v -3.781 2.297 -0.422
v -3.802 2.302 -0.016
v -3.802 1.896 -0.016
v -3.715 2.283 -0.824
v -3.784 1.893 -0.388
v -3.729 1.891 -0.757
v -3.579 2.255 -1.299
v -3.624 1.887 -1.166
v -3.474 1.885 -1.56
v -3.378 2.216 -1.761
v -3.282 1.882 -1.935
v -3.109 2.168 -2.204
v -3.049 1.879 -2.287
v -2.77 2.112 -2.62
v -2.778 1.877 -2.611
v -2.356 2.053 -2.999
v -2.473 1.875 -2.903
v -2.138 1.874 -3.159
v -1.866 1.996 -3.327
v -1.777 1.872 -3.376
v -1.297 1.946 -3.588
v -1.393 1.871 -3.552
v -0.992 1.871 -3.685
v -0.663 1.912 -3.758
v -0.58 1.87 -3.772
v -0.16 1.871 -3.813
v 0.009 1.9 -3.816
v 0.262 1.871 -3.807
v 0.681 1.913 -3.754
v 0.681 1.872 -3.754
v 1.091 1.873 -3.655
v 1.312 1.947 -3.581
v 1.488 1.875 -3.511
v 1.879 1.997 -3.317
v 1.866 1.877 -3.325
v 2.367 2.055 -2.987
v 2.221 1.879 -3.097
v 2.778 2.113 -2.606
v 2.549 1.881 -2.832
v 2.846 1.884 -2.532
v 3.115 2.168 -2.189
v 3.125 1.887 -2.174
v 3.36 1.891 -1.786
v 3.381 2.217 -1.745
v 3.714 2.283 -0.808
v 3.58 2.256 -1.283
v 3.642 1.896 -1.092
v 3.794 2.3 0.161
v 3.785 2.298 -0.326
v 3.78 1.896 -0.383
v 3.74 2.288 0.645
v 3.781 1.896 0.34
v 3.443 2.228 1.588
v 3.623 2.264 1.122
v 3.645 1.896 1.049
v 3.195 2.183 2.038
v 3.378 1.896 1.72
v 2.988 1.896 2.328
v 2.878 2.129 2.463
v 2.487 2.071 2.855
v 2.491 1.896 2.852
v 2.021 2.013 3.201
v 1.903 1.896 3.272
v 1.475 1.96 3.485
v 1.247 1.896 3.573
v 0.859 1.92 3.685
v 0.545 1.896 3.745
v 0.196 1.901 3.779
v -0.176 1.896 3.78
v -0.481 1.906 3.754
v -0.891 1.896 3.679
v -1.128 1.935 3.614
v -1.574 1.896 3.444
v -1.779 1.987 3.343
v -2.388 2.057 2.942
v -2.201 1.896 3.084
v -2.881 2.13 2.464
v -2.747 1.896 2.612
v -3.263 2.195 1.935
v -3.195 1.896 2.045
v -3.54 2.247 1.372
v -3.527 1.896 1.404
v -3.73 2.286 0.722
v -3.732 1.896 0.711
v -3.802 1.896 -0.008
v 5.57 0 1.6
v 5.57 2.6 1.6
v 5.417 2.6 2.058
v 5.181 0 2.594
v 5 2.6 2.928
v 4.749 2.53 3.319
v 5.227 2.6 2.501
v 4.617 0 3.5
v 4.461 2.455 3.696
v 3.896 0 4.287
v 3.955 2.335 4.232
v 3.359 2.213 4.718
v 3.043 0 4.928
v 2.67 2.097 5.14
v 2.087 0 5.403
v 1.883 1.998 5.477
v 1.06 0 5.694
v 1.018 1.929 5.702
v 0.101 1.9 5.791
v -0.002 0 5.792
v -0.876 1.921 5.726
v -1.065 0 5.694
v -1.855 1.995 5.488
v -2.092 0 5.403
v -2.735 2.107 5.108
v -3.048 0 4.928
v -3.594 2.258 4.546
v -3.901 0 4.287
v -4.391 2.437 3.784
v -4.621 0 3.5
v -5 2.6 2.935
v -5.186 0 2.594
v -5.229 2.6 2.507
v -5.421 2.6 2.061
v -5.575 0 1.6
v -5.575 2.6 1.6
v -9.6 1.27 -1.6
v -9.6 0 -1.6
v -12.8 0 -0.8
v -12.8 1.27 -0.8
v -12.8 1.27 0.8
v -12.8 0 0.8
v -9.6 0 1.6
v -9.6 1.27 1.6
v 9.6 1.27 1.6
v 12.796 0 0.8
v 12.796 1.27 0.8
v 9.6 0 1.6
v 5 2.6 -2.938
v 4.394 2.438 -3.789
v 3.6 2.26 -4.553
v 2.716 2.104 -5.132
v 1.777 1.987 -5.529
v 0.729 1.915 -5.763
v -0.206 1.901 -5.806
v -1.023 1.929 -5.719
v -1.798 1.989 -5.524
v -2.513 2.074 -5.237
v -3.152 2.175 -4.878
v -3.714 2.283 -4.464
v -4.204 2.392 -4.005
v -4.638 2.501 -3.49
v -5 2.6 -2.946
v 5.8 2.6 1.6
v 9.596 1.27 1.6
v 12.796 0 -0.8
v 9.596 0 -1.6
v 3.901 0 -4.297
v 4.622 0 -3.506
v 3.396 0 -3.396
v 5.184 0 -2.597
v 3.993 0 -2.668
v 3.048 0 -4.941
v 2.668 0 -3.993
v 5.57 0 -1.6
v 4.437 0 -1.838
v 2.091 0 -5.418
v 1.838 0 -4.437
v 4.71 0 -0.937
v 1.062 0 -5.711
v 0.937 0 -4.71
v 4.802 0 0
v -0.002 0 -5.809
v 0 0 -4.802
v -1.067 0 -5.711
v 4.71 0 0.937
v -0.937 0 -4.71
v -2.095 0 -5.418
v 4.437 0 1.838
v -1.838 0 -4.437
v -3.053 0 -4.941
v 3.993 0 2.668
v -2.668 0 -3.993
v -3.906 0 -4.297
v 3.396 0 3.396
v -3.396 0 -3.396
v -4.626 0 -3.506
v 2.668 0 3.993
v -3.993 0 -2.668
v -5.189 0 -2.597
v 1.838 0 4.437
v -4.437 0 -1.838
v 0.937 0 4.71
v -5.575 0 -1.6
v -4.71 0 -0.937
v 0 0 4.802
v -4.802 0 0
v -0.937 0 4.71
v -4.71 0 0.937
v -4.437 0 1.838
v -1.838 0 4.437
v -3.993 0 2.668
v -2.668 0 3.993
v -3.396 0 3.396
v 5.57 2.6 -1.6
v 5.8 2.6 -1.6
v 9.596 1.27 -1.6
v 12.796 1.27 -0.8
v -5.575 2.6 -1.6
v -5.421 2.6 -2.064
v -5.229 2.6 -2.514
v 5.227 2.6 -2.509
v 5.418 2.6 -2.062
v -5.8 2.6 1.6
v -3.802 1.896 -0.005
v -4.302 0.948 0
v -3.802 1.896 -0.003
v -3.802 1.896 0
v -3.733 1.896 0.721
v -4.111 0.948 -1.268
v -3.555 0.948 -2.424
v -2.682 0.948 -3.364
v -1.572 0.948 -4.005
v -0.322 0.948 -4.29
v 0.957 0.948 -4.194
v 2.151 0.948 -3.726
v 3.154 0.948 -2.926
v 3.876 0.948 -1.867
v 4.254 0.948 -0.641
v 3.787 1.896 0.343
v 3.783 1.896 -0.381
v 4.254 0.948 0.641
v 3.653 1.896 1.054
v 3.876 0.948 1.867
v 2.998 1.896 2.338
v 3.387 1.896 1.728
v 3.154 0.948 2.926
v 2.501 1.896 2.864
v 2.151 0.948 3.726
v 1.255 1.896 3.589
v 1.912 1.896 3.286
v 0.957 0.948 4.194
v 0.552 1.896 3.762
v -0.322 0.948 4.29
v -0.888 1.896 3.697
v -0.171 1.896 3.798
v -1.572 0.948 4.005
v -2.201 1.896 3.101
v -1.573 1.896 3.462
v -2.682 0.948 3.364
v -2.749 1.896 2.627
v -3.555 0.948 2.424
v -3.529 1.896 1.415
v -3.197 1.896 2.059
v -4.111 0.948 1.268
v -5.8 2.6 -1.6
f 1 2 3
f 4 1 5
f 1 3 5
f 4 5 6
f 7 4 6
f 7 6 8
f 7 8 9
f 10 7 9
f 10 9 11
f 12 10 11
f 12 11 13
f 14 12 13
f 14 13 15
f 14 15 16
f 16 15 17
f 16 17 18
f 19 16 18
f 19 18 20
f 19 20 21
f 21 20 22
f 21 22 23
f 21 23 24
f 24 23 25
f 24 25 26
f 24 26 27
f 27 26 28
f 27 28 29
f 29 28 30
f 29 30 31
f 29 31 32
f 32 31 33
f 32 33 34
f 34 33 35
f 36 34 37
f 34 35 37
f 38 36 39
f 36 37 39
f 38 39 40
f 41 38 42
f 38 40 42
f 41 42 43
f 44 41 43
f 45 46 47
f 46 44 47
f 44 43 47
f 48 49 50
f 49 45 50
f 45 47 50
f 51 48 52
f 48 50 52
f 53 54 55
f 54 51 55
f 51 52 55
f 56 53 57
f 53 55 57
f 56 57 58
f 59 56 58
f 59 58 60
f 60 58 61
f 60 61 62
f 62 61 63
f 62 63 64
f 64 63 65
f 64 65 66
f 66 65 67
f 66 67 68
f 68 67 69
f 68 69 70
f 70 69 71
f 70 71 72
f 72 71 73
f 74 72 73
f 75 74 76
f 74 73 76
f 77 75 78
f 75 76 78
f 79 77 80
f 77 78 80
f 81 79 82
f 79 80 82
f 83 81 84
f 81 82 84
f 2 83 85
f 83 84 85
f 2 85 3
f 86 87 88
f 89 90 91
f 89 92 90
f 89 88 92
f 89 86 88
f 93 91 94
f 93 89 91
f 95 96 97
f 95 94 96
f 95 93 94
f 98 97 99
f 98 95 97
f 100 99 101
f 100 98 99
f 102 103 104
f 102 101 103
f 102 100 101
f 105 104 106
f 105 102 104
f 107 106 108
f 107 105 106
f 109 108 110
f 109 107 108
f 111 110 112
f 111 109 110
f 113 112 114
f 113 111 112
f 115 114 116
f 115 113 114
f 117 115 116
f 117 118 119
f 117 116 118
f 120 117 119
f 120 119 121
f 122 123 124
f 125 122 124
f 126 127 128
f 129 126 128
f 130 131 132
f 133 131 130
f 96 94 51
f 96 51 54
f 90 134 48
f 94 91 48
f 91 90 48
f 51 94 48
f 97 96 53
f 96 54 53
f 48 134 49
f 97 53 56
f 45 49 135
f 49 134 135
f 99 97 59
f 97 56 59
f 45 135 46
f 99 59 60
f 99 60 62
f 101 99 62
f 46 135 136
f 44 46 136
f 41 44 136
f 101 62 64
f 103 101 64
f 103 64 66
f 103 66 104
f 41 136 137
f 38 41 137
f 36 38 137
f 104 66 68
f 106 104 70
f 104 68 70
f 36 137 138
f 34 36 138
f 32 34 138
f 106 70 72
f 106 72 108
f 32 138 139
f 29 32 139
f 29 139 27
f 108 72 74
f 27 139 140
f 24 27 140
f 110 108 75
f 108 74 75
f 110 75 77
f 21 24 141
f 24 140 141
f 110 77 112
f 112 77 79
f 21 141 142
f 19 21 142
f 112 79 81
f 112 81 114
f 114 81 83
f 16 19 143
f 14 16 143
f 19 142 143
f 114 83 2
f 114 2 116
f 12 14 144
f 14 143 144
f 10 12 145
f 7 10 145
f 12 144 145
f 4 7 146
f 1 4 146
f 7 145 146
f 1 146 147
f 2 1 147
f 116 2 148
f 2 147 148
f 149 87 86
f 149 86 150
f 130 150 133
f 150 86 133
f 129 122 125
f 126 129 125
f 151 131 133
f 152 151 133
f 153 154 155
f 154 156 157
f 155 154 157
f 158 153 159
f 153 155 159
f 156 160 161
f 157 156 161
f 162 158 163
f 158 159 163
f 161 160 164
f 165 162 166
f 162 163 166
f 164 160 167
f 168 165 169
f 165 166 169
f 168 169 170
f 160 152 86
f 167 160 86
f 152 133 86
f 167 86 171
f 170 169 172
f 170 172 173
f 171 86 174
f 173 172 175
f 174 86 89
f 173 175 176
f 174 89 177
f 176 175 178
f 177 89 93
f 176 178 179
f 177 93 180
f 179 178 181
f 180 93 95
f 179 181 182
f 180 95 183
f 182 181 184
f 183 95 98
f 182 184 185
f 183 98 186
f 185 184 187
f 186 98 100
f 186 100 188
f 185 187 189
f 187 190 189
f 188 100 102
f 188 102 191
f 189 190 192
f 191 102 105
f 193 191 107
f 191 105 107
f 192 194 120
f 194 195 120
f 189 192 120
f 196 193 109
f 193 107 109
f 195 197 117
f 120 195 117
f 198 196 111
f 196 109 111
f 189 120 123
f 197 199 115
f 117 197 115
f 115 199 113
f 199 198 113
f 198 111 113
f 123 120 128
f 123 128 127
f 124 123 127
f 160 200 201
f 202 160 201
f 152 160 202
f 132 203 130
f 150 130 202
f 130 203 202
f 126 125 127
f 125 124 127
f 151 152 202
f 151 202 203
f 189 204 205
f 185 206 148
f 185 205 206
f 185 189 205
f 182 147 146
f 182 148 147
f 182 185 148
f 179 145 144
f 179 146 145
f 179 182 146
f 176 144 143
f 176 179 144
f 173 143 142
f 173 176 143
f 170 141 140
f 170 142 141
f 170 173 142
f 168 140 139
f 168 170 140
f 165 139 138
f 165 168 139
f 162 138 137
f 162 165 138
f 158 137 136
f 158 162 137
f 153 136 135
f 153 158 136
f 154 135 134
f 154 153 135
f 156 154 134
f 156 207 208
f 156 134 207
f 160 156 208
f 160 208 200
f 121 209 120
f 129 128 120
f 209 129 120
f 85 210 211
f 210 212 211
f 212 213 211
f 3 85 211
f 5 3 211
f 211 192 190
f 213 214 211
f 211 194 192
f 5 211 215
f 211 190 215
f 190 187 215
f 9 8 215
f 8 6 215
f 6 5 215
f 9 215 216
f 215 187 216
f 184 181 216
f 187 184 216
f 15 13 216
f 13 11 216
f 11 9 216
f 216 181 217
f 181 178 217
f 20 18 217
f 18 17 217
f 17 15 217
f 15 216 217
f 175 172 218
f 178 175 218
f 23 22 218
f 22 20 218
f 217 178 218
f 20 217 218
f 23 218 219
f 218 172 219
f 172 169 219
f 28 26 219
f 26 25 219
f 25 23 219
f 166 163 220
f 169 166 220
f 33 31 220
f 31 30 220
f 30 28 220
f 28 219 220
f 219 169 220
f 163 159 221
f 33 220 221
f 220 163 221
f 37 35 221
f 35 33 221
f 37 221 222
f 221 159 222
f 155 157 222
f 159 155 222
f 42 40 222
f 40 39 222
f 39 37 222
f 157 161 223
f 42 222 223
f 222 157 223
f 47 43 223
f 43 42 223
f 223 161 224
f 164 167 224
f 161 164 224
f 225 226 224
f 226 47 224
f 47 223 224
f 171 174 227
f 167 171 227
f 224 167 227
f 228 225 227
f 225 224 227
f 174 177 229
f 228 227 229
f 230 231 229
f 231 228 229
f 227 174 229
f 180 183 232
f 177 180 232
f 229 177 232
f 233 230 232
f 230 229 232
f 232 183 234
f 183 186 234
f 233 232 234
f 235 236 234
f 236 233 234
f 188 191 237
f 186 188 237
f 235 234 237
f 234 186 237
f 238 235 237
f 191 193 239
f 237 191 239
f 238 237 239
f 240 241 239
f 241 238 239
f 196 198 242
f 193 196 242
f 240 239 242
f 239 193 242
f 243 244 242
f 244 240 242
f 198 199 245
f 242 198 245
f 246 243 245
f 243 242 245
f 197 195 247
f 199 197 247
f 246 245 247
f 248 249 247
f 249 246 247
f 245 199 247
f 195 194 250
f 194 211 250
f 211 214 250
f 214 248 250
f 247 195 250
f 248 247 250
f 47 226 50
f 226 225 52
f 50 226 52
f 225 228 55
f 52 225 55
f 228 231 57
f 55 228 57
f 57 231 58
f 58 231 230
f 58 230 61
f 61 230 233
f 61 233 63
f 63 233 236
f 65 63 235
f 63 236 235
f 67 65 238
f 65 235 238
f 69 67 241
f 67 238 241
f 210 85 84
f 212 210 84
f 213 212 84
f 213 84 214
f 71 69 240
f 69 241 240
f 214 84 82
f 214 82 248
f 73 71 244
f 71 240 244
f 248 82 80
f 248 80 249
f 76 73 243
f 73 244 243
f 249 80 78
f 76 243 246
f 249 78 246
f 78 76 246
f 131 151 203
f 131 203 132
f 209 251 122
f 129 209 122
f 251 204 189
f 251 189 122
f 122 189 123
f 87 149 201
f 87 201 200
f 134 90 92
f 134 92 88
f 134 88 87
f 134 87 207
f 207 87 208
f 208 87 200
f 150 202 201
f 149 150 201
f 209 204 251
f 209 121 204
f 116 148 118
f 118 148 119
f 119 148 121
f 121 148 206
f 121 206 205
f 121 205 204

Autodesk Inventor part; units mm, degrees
ref_plane "YZ Plane" through (0, 0, 0) normal (1, 0, 0) x (0, 1, 0)
ref_plane "XZ Plane" through (0, 0, 0) normal (0, 1, 0) x (-1, 0, 0)
ref_plane "XY Plane" through (0, 0, 0) normal (0, 0, 1) x (1, 0, 0)
sketch "Sketch1" plane through (0, 0, 0) normal (0, 1, 0) x (-1, 0, 0)
  circle A0 centre (0, 0) radius 4.8
  line L0 (5.5749, -1.6) -> (9.6, -1.6)
  line L1 (9.6, -1.6) -> (12.8, -0.8)
  line L2 (12.8, -0.8) -> (12.8, 0.8)
  line L3 (12.8, 0.8) -> (9.6, 1.6)
  line L4 (9.6, 1.6) -> (5.5749, 1.6)
  arc A1 (5.5749, 1.6) -> (-5.5704, 1.6) centre (0.0023, -0.0079) ccw
  line L5 (-5.5704, 1.6) -> (-9.6, 1.6)
  line L6 (-5.5704, -1.6) -> (-9.5955, -1.6)
  line L7 (-9.5955, -1.6) -> (-12.7955, -0.8)
  line L8 (-12.7955, -0.8) -> (-12.7955, 0.8)
  line L9 (-12.7955, 0.8) -> (-9.5955, 1.6)
  line L10 (-9.5955, 1.6) -> (-5.5704, 1.6)
  arc A2 (-5.5704, -1.6) -> (5.5749, -1.6) centre (0.0023, -0.0158) ccw
  circle A3 centre (0.0023, -0.0158) radius 3.8
  point P0 (-9.6, -1.207)
  dimension "d0" = 9.6
  dimension "d9" = 7.6
extrude "Extrusion1" add sketch "Sketch1" along normal blind 2.6 contours A0 | A2 L6 L7 L8 L9 L5 A1 L4 L3 L2 L1 L0
sketch "Sketch16" plane through (0, 0, 0) normal (0, 0, 1) x (1, 0, 0)
  line L0 (12.7955, 0) -> (12.7955, 2.6) projected
  line L1 (12.7955, 1.27) -> (9.5955, 1.27)
  line L2 (9.5955, 0) -> (9.5955, 2.6) projected
  line L3 (9.5955, 1.27) -> (5.8, 2.6)
  arc A0 (-5, 2.6) -> (5, 2.6) centre (0, 20.1101) ccw
  line L4 (-9.6, 0) -> (-9.6, 2.6) projected
  line L5 (12.7955, 1.27) -> (12.7955, 5.6941)
  line L6 (-12.8, 0) -> (-12.8, 2.6) projected
  line L7 (-12.8, 1.27) -> (-12.8, 6.6119)
  line L8 (-12.8, 6.6119) -> (12.7955, 5.6941)
  line L9 (5.8, 2.6) -> (5, 2.6)
  line L10 (-5, 2.6) -> (-5.8, 2.6)
  line L11 (-5.8, 2.6) -> (-9.6, 1.27)
  line L12 (-9.6, 1.27) -> (-12.8, 1.27)
  line L13 (9.5955, 1.27) -> (5.8, 2.6)
  line L14 (9.5955, 1.27) -> (5.8, 2.6)
  line L15 (5.8, 2.6) -> (5, 2.6)
  point P0 (0, 0)
  dimension "d5" = 10
  dimension "d6" = 18.21
extrude "Extrusion3" cut sketch "Sketch16" along normal mid plane 12
sketch "Sketch17" plane through (0, 0, 0) normal (0, 0, 1) x (1, 0, 0)
  point P0 (0, 0)
sketch "Sketch18" plane through (0, 0, 0) normal (0, 0, 1) x (1, 0, 0)
  line L0 (-3.8023, 0) -> (-3.8023, 2.3015) projected
  line L1 (-3.8023, 1.8964) -> (0, 1.8964)
  line L2 (3.7977, 0) -> (3.7977, 2.3005) projected
  line L3 (-5.5749, 0) -> (5.5704, 0) projected
  line L4 (3.7977, 1.8964) -> (5.9415, 1.8964) construction
  line L5 (-3.8023, 1.8964) -> (-4.8021, 0)
  line L6 (-3.8023, 1.8964) -> (-1.6585, 1.8964) construction
  line L7 (0, 0) -> (0, 1.9)
  line L8 (0, 0) -> (-4.8021, 0)
  dimension "d11" = 117.8
revolve "Revolution1" cut sketch "Sketch18" angle 360 about axis through (0, 0, 0) along (0, 1, 0)
properties part number "HeadBar" material "Titanium"
